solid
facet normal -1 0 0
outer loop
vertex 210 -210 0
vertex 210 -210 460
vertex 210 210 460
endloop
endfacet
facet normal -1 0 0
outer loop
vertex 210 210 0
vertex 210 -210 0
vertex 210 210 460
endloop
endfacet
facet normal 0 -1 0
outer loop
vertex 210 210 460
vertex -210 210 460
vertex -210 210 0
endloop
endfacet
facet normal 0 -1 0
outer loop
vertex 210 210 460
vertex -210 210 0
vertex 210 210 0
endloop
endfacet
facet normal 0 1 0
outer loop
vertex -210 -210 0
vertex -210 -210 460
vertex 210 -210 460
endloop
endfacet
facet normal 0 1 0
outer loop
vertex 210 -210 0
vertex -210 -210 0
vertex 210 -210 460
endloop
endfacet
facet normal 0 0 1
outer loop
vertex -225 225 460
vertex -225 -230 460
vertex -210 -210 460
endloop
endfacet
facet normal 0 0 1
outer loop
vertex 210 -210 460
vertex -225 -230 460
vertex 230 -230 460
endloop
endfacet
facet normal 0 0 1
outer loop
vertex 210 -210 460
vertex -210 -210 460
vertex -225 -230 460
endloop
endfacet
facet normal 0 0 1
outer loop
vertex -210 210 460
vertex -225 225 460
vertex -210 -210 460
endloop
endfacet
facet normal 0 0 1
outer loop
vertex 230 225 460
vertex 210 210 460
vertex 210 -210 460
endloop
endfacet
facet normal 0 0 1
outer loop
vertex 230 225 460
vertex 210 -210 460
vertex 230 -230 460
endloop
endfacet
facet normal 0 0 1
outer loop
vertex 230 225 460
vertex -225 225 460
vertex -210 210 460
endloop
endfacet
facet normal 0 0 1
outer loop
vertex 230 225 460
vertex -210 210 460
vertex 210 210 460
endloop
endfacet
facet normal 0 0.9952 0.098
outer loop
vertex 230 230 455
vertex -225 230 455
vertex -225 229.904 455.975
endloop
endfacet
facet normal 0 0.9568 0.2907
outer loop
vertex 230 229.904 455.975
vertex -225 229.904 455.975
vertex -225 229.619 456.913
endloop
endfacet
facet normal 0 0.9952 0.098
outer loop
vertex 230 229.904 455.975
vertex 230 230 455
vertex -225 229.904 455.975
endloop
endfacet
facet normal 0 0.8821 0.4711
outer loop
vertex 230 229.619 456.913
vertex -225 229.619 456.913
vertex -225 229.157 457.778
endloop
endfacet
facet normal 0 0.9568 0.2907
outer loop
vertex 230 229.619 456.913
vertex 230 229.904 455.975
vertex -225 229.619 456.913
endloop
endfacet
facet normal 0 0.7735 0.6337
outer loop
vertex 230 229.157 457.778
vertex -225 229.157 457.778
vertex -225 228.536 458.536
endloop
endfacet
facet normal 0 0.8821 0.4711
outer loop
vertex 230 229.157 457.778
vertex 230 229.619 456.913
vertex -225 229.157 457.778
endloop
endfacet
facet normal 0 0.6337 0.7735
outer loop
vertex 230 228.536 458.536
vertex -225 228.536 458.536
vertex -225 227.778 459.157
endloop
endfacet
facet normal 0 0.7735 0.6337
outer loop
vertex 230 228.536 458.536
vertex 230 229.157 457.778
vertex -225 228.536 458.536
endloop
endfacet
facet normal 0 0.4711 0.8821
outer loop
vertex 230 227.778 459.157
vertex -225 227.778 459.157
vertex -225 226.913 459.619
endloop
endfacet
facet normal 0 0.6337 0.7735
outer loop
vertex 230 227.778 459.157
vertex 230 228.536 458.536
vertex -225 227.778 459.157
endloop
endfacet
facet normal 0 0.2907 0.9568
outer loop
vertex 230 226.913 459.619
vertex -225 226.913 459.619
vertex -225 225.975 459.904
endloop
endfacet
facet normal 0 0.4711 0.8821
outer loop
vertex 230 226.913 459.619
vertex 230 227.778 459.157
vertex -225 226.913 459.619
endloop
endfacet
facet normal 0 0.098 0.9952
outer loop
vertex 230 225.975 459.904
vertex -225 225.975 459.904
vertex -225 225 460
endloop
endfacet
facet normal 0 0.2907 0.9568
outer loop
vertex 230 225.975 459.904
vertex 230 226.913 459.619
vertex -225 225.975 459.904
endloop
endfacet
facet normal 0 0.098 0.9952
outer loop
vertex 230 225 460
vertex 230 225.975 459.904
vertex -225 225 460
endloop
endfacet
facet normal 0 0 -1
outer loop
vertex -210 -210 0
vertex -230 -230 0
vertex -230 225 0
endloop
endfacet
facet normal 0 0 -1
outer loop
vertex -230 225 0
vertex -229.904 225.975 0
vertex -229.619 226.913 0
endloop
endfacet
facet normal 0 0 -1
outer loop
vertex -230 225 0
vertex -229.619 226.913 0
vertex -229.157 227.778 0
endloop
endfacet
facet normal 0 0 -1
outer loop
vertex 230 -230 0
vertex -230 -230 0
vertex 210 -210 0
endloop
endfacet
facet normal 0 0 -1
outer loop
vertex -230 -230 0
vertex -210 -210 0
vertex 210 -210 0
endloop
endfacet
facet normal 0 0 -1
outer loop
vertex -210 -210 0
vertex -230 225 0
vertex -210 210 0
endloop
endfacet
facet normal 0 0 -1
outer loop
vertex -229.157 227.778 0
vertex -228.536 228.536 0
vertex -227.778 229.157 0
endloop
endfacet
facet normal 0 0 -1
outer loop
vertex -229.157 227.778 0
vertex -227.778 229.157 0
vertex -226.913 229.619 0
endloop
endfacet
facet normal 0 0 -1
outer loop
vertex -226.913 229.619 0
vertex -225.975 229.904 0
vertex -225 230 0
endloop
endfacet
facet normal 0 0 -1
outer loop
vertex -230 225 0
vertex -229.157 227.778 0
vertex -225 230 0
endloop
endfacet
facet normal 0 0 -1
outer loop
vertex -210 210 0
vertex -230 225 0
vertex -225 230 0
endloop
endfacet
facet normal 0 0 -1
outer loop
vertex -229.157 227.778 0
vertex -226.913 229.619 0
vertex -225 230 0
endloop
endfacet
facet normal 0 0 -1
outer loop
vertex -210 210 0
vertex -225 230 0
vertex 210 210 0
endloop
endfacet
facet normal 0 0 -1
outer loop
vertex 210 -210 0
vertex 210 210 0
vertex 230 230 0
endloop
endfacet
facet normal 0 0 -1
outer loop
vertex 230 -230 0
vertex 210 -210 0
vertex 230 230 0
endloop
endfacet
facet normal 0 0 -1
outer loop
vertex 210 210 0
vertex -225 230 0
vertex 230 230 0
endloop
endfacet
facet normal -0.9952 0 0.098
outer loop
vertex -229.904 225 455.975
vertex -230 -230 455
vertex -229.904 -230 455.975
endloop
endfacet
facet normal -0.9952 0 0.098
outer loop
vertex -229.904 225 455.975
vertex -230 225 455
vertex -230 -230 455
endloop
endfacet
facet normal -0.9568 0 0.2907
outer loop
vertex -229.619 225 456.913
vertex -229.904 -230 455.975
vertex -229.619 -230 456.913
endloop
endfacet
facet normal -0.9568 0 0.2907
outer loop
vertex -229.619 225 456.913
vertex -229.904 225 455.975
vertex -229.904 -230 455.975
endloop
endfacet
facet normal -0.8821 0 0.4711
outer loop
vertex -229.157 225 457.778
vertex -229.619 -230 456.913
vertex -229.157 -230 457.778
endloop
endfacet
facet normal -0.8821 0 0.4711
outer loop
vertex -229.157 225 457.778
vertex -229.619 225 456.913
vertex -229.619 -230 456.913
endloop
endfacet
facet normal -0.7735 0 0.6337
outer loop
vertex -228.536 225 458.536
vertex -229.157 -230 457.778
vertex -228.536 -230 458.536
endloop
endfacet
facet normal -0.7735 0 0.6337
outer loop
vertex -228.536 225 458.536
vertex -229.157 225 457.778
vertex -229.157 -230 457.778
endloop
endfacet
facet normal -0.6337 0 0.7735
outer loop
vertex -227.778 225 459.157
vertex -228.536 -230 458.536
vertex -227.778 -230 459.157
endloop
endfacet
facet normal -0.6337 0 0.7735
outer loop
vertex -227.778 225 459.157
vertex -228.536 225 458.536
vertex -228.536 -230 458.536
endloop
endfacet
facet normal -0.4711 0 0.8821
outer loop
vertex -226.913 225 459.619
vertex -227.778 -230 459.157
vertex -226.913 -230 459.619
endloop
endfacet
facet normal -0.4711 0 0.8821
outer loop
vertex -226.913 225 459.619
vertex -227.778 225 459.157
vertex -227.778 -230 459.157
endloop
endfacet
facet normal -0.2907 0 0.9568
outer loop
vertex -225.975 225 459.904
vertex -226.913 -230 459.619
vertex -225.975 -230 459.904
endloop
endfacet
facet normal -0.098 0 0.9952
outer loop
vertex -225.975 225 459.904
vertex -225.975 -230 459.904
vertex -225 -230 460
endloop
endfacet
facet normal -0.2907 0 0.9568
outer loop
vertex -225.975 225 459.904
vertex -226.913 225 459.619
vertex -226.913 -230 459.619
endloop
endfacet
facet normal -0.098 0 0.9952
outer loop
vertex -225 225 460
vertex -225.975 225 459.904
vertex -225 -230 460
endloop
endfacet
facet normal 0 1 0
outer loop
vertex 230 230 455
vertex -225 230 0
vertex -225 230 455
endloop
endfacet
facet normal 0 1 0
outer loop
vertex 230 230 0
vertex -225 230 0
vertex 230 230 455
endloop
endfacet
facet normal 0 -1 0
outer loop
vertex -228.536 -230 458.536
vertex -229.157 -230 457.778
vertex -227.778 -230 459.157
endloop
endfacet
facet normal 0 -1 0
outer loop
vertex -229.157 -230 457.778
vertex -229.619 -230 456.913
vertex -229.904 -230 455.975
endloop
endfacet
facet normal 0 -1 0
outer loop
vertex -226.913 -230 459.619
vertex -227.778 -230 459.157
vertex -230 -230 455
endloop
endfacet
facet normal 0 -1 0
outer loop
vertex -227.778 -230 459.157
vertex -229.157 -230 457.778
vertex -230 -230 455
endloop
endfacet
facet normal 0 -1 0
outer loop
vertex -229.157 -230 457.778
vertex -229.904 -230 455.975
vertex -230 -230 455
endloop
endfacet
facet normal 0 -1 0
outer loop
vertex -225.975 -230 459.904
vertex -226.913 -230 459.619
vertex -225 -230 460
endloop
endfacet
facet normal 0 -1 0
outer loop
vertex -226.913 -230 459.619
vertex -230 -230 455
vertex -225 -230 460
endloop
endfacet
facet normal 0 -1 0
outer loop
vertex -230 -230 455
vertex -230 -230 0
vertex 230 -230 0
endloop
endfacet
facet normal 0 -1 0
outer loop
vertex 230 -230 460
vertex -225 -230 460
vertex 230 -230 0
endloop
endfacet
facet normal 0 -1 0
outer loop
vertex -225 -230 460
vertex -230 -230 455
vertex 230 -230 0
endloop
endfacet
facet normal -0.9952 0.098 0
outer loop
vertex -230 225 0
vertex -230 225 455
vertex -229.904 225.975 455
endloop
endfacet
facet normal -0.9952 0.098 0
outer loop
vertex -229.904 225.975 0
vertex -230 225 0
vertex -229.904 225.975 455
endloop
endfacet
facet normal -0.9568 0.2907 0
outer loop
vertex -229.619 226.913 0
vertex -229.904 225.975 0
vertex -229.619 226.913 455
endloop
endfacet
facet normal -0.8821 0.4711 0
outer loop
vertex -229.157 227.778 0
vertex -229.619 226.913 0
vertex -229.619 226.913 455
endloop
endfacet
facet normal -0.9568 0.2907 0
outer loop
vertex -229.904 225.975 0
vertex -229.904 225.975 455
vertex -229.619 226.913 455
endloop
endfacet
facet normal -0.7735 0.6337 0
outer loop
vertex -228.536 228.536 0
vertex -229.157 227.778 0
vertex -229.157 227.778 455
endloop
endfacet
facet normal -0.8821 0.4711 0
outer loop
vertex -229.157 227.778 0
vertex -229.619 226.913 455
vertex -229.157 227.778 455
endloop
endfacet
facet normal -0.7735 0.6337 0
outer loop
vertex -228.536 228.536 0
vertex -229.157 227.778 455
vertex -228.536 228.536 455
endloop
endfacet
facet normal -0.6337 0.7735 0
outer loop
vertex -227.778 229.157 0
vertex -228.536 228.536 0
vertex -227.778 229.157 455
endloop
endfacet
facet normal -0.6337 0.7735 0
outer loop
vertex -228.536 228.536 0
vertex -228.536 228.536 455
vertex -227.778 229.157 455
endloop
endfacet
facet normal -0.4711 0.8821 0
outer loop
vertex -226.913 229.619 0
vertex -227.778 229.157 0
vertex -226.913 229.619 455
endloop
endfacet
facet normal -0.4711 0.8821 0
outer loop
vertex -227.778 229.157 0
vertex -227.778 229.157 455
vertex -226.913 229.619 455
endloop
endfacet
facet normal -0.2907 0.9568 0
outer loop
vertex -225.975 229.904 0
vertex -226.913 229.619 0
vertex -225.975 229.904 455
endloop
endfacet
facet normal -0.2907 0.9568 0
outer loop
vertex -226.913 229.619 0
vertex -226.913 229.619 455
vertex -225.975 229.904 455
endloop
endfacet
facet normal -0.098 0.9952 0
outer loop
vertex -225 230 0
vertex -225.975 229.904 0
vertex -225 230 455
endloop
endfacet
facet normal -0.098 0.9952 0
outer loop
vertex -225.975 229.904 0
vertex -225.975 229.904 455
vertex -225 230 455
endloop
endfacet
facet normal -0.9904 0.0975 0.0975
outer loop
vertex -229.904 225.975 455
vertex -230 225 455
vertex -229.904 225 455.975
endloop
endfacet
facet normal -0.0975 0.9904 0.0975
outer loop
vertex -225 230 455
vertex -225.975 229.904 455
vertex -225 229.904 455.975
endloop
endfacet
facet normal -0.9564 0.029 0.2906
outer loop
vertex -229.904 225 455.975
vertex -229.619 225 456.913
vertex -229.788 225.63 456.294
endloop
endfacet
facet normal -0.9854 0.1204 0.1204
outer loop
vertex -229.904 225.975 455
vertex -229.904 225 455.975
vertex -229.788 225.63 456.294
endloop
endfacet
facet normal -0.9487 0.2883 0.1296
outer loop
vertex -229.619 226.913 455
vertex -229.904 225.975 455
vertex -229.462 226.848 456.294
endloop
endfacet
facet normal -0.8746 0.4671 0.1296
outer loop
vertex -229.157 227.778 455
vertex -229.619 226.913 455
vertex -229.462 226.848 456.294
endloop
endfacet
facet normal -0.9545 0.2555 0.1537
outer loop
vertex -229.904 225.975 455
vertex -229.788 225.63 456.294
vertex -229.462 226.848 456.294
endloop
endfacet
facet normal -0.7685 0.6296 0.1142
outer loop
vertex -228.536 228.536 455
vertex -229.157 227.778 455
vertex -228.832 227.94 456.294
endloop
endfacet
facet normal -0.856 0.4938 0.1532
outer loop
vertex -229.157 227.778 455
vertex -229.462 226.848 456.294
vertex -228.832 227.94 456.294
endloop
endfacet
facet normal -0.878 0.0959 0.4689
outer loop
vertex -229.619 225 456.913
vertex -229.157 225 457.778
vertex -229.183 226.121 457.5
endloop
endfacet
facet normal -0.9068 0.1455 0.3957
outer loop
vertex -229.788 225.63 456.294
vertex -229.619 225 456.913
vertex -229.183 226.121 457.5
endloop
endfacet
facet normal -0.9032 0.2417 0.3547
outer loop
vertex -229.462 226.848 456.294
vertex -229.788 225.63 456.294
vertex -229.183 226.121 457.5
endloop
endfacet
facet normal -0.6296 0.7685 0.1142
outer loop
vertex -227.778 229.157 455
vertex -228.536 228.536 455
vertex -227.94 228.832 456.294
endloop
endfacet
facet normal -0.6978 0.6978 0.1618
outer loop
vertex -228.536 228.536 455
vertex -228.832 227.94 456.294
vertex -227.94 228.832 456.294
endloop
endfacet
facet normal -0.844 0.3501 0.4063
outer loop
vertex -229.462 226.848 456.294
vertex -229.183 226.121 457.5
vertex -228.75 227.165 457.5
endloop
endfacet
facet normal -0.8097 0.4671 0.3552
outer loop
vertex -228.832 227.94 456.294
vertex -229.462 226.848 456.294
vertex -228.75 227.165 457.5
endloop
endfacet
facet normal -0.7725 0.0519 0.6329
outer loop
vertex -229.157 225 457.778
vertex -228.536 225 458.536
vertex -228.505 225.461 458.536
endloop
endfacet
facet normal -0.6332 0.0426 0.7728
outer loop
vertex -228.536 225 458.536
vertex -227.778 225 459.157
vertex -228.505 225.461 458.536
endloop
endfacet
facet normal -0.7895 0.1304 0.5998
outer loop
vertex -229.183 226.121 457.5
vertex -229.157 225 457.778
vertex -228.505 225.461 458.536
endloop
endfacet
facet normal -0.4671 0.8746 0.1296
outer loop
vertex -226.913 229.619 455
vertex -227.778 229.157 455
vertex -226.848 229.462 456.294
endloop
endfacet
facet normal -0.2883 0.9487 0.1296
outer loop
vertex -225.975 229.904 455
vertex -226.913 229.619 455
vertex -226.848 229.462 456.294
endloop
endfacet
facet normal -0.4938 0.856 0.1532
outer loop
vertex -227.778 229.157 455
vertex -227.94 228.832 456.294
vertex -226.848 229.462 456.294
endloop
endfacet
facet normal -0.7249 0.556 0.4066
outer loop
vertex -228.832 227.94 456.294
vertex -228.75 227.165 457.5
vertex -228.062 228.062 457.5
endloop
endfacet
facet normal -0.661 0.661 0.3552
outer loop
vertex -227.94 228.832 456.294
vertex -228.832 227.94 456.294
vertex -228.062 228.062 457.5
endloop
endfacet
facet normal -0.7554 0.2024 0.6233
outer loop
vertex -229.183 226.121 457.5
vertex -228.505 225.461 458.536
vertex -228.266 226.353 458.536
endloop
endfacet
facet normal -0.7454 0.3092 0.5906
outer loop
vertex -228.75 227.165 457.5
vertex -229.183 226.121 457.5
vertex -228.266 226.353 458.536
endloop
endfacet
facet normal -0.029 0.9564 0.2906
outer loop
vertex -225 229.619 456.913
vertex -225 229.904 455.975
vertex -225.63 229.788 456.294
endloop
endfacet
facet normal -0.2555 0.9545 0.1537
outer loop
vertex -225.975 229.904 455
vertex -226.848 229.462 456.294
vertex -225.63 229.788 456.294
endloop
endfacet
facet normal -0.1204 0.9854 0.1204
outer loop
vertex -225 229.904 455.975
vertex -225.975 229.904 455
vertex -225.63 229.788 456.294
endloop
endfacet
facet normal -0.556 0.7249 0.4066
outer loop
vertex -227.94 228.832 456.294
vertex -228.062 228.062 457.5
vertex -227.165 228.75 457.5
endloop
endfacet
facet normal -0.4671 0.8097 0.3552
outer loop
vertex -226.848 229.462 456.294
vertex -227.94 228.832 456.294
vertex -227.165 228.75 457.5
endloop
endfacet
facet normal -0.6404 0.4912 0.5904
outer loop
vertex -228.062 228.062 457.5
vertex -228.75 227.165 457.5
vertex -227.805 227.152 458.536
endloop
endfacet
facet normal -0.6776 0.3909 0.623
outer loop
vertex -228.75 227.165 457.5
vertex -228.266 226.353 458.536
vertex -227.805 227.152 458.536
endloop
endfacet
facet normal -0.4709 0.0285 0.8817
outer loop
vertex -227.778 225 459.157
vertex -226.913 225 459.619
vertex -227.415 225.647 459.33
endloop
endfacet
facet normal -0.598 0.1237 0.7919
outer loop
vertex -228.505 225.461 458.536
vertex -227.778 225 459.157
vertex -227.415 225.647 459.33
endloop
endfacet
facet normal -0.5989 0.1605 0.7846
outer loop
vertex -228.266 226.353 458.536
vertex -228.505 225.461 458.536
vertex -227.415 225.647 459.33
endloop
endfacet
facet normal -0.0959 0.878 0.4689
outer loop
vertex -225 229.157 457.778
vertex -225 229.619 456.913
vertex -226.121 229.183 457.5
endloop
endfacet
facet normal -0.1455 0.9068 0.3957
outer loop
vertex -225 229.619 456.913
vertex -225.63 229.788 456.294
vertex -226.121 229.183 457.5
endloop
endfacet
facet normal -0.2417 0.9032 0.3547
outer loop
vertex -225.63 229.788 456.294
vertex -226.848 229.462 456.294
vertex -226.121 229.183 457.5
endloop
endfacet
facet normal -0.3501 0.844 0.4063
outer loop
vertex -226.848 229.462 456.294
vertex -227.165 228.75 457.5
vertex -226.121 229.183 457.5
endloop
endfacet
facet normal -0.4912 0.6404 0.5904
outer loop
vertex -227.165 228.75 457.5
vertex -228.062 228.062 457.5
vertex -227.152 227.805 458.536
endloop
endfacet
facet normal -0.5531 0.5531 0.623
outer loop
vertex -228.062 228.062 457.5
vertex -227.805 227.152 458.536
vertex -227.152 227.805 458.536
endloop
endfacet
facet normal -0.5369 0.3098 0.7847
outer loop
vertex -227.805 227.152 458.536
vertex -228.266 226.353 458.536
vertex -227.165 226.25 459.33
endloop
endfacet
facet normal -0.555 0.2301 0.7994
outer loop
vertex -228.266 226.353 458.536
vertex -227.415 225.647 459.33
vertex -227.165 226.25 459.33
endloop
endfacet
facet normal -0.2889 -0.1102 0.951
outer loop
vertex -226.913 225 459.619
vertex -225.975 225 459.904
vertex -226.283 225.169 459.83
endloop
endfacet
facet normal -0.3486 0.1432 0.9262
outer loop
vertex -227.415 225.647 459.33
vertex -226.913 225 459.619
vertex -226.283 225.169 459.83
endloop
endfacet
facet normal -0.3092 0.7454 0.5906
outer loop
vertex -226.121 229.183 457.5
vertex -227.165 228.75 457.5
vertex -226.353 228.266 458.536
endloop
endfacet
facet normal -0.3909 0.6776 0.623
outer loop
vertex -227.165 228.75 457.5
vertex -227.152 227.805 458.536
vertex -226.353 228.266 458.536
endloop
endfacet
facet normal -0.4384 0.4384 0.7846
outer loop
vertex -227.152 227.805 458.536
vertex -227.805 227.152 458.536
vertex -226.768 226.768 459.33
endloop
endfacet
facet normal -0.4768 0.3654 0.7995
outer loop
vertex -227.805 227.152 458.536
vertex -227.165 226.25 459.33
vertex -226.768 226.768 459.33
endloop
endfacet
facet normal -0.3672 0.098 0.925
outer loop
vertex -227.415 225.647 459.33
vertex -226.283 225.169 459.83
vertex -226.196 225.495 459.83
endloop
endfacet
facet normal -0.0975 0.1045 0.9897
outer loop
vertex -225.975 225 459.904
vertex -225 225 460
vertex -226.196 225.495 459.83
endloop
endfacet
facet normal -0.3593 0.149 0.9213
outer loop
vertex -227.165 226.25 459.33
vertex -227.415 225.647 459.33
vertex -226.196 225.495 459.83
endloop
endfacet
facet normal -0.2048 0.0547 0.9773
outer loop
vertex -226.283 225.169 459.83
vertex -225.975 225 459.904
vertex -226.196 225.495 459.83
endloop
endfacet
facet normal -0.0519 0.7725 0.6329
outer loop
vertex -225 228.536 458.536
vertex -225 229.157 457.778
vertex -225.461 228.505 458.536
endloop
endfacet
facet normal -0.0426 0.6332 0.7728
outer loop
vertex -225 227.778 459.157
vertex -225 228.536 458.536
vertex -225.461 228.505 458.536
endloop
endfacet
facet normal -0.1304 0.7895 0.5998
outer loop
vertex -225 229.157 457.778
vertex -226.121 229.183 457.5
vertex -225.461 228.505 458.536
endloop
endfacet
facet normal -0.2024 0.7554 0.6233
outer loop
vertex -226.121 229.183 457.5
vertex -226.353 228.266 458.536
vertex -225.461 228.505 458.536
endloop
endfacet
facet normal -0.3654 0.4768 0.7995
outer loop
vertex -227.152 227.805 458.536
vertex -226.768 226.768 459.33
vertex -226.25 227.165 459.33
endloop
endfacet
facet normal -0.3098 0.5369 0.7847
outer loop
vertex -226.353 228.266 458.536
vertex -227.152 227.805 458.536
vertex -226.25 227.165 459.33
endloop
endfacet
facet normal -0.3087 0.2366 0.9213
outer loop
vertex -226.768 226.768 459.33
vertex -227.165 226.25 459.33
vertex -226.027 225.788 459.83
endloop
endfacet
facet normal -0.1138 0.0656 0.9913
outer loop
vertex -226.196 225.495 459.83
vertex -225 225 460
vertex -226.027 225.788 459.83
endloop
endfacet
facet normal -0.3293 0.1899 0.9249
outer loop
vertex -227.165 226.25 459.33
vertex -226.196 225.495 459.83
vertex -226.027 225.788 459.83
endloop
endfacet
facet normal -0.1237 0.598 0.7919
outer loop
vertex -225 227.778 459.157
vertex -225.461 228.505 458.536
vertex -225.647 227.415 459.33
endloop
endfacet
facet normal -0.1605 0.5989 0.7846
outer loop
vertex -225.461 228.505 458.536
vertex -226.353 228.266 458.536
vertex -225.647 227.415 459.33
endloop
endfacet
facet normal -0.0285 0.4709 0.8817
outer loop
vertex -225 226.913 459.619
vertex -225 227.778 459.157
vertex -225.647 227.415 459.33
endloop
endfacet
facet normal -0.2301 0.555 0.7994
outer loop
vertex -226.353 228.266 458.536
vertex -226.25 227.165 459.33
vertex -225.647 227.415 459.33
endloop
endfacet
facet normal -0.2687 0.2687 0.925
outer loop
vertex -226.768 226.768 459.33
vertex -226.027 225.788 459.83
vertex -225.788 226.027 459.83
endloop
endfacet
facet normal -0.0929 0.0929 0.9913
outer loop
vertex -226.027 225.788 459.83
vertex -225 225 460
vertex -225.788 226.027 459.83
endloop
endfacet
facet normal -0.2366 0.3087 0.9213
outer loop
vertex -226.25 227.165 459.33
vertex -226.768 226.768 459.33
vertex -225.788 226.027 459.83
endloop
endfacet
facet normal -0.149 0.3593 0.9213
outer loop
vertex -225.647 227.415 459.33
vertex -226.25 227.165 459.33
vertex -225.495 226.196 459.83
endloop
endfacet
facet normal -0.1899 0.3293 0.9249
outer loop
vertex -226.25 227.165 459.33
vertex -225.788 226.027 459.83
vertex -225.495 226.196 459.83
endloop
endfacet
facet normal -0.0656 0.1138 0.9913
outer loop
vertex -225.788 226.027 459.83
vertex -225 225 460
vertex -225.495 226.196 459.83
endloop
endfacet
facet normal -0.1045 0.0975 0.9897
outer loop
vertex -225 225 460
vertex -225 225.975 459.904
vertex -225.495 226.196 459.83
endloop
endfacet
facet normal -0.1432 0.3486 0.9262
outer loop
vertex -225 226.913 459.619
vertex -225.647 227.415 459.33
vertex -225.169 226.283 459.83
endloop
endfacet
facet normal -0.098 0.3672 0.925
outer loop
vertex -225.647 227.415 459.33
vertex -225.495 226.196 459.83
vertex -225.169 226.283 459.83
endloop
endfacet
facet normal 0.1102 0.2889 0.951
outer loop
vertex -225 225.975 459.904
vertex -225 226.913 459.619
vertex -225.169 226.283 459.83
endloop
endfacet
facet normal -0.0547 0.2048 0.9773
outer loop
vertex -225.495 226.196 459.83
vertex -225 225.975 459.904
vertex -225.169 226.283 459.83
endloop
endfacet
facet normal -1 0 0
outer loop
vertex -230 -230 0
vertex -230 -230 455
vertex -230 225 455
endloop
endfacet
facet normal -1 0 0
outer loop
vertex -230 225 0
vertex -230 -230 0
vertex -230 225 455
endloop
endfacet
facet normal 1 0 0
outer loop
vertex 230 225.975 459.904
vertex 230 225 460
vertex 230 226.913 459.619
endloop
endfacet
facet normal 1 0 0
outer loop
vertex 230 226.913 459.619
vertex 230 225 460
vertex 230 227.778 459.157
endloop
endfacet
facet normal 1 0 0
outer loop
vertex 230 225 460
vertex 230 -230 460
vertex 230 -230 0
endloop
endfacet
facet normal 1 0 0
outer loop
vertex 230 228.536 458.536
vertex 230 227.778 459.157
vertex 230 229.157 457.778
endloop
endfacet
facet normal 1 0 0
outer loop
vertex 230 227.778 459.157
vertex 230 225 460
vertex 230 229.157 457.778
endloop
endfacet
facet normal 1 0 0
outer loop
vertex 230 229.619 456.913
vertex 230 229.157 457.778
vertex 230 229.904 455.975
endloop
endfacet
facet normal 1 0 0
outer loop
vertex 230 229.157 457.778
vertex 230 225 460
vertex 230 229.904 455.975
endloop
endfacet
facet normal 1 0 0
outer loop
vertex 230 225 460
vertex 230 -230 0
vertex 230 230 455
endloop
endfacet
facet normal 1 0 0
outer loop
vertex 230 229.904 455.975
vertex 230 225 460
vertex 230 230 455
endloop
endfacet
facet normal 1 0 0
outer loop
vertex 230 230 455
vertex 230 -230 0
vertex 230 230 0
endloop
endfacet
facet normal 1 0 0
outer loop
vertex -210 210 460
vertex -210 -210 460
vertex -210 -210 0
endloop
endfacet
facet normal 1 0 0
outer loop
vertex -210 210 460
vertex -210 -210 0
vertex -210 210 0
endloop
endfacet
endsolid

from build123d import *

# Parameters (mm, degrees)
F2_W     = 460
F2_H     = 460
F2_W_2   = 420
F2_H_2   = 420
F3_DEPTH = 460
F4_R     = 5
F5_R     = 5


# Not quite as in the source:
# - the program builds the solid bodies; features that only make, move or delete a surface that nothing else refers to are left out


with BuildPart() as f3:
    # F2 (on Top) → F3 (new body)
    with BuildSketch(Plane.XY):
        Rectangle(F2_W, F2_H)
        Rectangle(F2_W_2, F2_H_2, mode=Mode.SUBTRACT)
    extrude(amount=F3_DEPTH)

    # F4
    f4_edges = [f3.edges().sort_by_distance(p)[0] for p in [
        (-230, 230, 230),
    ]]
    fillet(f4_edges, radius=F4_R)

    # F5
    f5_edges = [f3.edges().sort_by_distance(p)[0] for p in [
        (-230, -2.5, 460),
    ]]
    fillet(f5_edges, radius=F5_R)


solid = f3.part
